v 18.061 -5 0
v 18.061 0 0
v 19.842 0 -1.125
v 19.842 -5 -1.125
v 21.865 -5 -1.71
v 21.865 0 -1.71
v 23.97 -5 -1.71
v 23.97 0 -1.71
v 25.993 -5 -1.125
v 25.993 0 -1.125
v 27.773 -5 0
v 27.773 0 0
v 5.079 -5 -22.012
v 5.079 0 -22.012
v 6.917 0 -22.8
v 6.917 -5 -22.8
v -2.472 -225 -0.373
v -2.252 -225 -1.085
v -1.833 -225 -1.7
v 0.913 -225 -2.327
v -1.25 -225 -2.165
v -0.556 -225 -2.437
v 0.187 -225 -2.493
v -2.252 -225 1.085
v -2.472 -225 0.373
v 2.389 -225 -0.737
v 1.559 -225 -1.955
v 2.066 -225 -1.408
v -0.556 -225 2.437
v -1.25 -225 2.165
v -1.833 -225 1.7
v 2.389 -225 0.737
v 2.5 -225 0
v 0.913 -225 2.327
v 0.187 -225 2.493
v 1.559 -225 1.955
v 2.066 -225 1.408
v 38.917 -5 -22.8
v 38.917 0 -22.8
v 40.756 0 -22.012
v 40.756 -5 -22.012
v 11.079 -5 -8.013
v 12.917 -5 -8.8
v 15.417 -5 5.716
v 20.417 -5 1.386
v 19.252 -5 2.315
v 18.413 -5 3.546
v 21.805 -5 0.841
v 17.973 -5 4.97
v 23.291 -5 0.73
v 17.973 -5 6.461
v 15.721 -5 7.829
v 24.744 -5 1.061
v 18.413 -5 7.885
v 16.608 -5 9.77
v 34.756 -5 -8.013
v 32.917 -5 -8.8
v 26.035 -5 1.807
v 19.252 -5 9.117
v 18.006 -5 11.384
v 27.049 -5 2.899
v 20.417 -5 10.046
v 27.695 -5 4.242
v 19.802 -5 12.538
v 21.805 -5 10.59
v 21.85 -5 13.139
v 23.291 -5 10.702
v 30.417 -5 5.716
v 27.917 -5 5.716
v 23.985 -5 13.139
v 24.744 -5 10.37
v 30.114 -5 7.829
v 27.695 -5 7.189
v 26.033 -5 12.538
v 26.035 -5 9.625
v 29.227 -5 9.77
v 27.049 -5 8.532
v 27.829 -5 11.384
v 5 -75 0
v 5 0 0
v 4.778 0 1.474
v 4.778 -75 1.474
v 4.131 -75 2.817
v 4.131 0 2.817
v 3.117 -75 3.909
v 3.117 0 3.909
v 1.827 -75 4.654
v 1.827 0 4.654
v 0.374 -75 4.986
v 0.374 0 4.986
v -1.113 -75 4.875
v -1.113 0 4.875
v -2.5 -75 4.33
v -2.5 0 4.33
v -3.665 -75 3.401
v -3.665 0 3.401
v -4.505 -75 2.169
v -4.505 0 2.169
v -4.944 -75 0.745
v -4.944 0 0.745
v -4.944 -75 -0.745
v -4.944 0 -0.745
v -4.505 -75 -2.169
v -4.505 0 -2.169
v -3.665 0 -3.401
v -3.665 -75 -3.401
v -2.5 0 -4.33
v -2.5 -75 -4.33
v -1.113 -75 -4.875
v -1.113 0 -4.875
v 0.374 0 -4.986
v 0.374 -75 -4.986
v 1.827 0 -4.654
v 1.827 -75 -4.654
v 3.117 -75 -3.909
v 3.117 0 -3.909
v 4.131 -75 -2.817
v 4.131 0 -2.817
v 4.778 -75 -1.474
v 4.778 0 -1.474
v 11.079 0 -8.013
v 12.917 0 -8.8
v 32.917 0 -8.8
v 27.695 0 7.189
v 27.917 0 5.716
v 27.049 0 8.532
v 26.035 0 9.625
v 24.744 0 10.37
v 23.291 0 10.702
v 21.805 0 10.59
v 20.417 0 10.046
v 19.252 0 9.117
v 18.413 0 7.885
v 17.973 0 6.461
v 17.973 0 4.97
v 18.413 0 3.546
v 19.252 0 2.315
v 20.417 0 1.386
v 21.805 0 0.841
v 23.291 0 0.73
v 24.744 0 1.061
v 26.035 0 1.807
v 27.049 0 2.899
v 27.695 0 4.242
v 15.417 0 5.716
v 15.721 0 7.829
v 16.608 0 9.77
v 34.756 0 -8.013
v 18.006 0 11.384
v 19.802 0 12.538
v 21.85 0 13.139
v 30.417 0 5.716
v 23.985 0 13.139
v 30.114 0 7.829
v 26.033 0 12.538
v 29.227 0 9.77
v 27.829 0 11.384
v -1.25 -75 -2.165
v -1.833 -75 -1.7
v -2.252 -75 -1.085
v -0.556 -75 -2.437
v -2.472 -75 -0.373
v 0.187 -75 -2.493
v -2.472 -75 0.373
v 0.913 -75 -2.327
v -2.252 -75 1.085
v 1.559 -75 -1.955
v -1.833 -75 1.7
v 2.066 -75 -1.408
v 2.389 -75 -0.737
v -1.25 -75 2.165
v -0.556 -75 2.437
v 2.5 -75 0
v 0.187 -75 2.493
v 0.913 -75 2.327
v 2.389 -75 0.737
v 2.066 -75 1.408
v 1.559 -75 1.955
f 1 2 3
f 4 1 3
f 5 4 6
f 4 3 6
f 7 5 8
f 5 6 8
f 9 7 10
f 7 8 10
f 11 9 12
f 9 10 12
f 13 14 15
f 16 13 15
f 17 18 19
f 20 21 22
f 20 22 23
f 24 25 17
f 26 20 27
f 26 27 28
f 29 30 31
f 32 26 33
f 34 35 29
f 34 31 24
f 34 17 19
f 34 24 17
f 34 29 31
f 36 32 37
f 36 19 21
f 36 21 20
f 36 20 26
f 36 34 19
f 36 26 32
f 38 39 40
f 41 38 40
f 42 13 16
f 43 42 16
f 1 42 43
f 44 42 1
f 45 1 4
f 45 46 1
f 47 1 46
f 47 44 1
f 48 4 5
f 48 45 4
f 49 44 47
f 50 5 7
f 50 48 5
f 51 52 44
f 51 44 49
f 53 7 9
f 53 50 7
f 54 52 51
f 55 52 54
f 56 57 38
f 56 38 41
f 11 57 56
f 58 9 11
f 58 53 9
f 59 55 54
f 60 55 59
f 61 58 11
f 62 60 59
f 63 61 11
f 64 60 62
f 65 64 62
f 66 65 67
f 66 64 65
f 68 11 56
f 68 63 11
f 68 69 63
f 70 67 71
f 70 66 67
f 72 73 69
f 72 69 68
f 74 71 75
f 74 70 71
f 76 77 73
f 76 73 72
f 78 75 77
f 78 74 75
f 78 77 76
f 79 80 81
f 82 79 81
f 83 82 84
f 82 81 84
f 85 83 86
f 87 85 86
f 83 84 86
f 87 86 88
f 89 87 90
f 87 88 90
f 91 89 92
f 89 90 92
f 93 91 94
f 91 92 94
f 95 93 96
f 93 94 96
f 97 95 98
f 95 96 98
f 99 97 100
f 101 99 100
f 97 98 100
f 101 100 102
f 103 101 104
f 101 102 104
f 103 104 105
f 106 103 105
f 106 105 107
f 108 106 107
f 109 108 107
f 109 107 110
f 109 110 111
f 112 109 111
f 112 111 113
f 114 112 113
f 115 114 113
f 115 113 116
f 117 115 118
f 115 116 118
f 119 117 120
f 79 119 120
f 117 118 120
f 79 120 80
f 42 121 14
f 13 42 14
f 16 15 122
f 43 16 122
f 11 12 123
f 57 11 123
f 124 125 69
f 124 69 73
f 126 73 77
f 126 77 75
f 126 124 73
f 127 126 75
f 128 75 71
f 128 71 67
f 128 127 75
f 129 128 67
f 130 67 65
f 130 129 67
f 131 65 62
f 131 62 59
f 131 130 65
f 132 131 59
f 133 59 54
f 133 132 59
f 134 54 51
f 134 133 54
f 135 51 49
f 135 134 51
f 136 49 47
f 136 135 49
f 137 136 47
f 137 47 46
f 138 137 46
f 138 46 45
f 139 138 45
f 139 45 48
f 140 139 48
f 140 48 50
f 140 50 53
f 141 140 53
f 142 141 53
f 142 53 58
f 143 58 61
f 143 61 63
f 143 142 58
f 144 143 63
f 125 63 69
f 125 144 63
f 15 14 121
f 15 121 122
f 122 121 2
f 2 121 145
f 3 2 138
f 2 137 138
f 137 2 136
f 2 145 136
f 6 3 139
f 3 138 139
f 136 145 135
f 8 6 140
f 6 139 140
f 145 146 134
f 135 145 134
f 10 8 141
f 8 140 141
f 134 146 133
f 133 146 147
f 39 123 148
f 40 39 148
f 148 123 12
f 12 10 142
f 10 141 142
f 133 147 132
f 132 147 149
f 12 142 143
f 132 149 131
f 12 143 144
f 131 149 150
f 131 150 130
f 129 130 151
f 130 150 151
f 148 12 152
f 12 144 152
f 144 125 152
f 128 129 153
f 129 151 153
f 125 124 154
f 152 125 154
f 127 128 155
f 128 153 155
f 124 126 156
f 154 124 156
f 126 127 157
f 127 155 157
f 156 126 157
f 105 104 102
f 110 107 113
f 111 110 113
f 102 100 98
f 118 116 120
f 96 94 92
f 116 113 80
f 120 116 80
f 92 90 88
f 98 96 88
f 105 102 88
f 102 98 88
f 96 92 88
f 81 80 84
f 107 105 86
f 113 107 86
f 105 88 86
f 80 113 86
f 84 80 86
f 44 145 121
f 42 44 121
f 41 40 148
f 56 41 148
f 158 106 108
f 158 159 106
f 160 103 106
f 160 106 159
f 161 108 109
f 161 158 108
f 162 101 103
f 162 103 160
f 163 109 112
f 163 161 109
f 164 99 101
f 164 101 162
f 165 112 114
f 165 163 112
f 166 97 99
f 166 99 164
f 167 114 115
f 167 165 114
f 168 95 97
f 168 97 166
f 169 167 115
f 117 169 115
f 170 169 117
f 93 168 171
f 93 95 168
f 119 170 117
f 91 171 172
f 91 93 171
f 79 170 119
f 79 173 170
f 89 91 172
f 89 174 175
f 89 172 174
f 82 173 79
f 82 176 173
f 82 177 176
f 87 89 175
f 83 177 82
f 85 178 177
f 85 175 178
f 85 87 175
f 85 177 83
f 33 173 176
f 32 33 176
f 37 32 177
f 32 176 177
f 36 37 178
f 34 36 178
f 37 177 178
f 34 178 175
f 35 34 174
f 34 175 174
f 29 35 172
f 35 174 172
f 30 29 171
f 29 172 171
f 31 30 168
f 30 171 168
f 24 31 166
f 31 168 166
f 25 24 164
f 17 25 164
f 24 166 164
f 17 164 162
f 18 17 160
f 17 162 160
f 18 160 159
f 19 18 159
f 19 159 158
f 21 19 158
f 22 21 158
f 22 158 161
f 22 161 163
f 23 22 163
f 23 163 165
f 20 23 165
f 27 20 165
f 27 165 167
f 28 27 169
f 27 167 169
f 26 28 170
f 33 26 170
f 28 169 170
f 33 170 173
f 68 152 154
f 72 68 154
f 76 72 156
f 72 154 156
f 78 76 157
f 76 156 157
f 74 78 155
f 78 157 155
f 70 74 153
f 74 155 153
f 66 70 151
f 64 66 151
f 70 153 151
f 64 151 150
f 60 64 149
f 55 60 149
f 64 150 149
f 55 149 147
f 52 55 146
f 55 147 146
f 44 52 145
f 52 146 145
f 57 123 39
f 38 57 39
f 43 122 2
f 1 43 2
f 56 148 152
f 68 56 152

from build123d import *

# Parameters (mm, degrees)
F0_R     = 5
F1_DEPTH = 75
F2_R     = 2.5
F3_DEPTH = 150
F4_R     = 5
F5_DEPTH = 5


with BuildPart() as f1:
    # F0 (on Front) → F1 (new body)
    with BuildSketch(Plane.XZ):
        Circle(F0_R)
    extrude(amount=F1_DEPTH)

    # F2 (on face) → F3 (join)
    with BuildSketch(Plane.XZ.offset(75)):
        Circle(F2_R)
    extrude(amount=F3_DEPTH)


with BuildPart() as f5:
    # F4 (on Front) → F5 (new body)
    with BuildSketch(Plane.XZ):
        with BuildLine():
            Line((34.756327, -8.013132), (30.417428, 5.715688))
            ThreePointArc((30.417428, 5.715688), (29.724415, 2.566889), (27.773446, 0))
            Line((27.773446, 0), (32.917428, -8.799549))
            Line((32.917428, -8.799549), (38.917428, -22.799549))
            Line((38.917428, -22.799549), (40.755718, -22.01171))
            Line((40.755718, -22.01171), (34.756327, -8.013132))
        make_face()
        with BuildLine():
            ThreePointArc((18.06141, 0), (16.110441, 2.566889), (15.417428, 5.715688))
            Line((15.417428, 5.715688), (11.078529, -8.013132))
            Line((11.078529, -8.013132), (5.079138, -22.01171))
            Line((5.079138, -22.01171), (6.917428, -22.799549))
            Line((6.917428, -22.799549), (12.917428, -8.799549))
            Line((12.917428, -8.799549), (18.06141, 0))
        make_face()
        with BuildLine():
            ThreePointArc((27.773446, 0), (29.724415, 2.566889), (30.417428, 5.715688))
            ThreePointArc((30.417428, 5.715688), (22.917428, 13.215688), (15.417428, 5.715688))
            ThreePointArc((15.417428, 5.715688), (16.110441, 2.566889), (18.06141, 0))
            ThreePointArc((18.06141, 0), (22.917428, -1.784312), (27.773446, 0))
        make_face()
        with Locations((22.917428, 5.715688)):
            Circle(F4_R, mode=Mode.SUBTRACT)
    extrude(amount=F5_DEPTH)


solid = Compound([f1.part, f5.part])
